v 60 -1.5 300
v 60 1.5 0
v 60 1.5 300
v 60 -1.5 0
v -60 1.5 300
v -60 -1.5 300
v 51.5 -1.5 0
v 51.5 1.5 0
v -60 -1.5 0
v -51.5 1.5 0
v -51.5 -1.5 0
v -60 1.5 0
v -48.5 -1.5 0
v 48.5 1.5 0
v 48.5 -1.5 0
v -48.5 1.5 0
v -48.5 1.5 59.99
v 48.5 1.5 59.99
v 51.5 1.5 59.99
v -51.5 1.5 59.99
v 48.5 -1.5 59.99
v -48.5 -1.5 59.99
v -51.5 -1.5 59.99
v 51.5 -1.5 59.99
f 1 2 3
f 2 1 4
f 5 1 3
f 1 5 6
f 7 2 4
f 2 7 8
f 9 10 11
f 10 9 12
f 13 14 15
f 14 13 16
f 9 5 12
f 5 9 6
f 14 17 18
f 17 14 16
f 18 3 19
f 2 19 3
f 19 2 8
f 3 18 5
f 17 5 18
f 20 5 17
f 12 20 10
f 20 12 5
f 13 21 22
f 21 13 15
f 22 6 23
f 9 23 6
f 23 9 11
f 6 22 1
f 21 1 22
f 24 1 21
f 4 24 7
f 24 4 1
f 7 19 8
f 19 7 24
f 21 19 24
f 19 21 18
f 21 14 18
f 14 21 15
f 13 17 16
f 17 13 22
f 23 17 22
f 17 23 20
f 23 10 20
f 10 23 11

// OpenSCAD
// file: config.scad
$fn = 50;
nothing = 0.01;

material_z = 3;

body_width = 120;
body_height = 300;

foot_x = 120;
foot_z = 120;
foot_sideshift = 50;
// main file
include <config.scad>;

module body()
{
    difference()
    {
        // Main plate
        translate([
            0,
            0,
            body_height/2
            ])
        cube([
            body_width,
            material_z,
            body_height
            ], center=true);

        translate([
            +foot_sideshift,
            0,
            foot_z/4 - nothing
            ])
        cube([
            material_z,
            material_z + 2*nothing,
            foot_z/2
            ], center=true);

        translate([
            -foot_sideshift,
            0,
            foot_z/4 - nothing
            ])
        cube([
            material_z,
            material_z + 2*nothing,
            foot_z/2
            ], center=true);
    }
}

body();
